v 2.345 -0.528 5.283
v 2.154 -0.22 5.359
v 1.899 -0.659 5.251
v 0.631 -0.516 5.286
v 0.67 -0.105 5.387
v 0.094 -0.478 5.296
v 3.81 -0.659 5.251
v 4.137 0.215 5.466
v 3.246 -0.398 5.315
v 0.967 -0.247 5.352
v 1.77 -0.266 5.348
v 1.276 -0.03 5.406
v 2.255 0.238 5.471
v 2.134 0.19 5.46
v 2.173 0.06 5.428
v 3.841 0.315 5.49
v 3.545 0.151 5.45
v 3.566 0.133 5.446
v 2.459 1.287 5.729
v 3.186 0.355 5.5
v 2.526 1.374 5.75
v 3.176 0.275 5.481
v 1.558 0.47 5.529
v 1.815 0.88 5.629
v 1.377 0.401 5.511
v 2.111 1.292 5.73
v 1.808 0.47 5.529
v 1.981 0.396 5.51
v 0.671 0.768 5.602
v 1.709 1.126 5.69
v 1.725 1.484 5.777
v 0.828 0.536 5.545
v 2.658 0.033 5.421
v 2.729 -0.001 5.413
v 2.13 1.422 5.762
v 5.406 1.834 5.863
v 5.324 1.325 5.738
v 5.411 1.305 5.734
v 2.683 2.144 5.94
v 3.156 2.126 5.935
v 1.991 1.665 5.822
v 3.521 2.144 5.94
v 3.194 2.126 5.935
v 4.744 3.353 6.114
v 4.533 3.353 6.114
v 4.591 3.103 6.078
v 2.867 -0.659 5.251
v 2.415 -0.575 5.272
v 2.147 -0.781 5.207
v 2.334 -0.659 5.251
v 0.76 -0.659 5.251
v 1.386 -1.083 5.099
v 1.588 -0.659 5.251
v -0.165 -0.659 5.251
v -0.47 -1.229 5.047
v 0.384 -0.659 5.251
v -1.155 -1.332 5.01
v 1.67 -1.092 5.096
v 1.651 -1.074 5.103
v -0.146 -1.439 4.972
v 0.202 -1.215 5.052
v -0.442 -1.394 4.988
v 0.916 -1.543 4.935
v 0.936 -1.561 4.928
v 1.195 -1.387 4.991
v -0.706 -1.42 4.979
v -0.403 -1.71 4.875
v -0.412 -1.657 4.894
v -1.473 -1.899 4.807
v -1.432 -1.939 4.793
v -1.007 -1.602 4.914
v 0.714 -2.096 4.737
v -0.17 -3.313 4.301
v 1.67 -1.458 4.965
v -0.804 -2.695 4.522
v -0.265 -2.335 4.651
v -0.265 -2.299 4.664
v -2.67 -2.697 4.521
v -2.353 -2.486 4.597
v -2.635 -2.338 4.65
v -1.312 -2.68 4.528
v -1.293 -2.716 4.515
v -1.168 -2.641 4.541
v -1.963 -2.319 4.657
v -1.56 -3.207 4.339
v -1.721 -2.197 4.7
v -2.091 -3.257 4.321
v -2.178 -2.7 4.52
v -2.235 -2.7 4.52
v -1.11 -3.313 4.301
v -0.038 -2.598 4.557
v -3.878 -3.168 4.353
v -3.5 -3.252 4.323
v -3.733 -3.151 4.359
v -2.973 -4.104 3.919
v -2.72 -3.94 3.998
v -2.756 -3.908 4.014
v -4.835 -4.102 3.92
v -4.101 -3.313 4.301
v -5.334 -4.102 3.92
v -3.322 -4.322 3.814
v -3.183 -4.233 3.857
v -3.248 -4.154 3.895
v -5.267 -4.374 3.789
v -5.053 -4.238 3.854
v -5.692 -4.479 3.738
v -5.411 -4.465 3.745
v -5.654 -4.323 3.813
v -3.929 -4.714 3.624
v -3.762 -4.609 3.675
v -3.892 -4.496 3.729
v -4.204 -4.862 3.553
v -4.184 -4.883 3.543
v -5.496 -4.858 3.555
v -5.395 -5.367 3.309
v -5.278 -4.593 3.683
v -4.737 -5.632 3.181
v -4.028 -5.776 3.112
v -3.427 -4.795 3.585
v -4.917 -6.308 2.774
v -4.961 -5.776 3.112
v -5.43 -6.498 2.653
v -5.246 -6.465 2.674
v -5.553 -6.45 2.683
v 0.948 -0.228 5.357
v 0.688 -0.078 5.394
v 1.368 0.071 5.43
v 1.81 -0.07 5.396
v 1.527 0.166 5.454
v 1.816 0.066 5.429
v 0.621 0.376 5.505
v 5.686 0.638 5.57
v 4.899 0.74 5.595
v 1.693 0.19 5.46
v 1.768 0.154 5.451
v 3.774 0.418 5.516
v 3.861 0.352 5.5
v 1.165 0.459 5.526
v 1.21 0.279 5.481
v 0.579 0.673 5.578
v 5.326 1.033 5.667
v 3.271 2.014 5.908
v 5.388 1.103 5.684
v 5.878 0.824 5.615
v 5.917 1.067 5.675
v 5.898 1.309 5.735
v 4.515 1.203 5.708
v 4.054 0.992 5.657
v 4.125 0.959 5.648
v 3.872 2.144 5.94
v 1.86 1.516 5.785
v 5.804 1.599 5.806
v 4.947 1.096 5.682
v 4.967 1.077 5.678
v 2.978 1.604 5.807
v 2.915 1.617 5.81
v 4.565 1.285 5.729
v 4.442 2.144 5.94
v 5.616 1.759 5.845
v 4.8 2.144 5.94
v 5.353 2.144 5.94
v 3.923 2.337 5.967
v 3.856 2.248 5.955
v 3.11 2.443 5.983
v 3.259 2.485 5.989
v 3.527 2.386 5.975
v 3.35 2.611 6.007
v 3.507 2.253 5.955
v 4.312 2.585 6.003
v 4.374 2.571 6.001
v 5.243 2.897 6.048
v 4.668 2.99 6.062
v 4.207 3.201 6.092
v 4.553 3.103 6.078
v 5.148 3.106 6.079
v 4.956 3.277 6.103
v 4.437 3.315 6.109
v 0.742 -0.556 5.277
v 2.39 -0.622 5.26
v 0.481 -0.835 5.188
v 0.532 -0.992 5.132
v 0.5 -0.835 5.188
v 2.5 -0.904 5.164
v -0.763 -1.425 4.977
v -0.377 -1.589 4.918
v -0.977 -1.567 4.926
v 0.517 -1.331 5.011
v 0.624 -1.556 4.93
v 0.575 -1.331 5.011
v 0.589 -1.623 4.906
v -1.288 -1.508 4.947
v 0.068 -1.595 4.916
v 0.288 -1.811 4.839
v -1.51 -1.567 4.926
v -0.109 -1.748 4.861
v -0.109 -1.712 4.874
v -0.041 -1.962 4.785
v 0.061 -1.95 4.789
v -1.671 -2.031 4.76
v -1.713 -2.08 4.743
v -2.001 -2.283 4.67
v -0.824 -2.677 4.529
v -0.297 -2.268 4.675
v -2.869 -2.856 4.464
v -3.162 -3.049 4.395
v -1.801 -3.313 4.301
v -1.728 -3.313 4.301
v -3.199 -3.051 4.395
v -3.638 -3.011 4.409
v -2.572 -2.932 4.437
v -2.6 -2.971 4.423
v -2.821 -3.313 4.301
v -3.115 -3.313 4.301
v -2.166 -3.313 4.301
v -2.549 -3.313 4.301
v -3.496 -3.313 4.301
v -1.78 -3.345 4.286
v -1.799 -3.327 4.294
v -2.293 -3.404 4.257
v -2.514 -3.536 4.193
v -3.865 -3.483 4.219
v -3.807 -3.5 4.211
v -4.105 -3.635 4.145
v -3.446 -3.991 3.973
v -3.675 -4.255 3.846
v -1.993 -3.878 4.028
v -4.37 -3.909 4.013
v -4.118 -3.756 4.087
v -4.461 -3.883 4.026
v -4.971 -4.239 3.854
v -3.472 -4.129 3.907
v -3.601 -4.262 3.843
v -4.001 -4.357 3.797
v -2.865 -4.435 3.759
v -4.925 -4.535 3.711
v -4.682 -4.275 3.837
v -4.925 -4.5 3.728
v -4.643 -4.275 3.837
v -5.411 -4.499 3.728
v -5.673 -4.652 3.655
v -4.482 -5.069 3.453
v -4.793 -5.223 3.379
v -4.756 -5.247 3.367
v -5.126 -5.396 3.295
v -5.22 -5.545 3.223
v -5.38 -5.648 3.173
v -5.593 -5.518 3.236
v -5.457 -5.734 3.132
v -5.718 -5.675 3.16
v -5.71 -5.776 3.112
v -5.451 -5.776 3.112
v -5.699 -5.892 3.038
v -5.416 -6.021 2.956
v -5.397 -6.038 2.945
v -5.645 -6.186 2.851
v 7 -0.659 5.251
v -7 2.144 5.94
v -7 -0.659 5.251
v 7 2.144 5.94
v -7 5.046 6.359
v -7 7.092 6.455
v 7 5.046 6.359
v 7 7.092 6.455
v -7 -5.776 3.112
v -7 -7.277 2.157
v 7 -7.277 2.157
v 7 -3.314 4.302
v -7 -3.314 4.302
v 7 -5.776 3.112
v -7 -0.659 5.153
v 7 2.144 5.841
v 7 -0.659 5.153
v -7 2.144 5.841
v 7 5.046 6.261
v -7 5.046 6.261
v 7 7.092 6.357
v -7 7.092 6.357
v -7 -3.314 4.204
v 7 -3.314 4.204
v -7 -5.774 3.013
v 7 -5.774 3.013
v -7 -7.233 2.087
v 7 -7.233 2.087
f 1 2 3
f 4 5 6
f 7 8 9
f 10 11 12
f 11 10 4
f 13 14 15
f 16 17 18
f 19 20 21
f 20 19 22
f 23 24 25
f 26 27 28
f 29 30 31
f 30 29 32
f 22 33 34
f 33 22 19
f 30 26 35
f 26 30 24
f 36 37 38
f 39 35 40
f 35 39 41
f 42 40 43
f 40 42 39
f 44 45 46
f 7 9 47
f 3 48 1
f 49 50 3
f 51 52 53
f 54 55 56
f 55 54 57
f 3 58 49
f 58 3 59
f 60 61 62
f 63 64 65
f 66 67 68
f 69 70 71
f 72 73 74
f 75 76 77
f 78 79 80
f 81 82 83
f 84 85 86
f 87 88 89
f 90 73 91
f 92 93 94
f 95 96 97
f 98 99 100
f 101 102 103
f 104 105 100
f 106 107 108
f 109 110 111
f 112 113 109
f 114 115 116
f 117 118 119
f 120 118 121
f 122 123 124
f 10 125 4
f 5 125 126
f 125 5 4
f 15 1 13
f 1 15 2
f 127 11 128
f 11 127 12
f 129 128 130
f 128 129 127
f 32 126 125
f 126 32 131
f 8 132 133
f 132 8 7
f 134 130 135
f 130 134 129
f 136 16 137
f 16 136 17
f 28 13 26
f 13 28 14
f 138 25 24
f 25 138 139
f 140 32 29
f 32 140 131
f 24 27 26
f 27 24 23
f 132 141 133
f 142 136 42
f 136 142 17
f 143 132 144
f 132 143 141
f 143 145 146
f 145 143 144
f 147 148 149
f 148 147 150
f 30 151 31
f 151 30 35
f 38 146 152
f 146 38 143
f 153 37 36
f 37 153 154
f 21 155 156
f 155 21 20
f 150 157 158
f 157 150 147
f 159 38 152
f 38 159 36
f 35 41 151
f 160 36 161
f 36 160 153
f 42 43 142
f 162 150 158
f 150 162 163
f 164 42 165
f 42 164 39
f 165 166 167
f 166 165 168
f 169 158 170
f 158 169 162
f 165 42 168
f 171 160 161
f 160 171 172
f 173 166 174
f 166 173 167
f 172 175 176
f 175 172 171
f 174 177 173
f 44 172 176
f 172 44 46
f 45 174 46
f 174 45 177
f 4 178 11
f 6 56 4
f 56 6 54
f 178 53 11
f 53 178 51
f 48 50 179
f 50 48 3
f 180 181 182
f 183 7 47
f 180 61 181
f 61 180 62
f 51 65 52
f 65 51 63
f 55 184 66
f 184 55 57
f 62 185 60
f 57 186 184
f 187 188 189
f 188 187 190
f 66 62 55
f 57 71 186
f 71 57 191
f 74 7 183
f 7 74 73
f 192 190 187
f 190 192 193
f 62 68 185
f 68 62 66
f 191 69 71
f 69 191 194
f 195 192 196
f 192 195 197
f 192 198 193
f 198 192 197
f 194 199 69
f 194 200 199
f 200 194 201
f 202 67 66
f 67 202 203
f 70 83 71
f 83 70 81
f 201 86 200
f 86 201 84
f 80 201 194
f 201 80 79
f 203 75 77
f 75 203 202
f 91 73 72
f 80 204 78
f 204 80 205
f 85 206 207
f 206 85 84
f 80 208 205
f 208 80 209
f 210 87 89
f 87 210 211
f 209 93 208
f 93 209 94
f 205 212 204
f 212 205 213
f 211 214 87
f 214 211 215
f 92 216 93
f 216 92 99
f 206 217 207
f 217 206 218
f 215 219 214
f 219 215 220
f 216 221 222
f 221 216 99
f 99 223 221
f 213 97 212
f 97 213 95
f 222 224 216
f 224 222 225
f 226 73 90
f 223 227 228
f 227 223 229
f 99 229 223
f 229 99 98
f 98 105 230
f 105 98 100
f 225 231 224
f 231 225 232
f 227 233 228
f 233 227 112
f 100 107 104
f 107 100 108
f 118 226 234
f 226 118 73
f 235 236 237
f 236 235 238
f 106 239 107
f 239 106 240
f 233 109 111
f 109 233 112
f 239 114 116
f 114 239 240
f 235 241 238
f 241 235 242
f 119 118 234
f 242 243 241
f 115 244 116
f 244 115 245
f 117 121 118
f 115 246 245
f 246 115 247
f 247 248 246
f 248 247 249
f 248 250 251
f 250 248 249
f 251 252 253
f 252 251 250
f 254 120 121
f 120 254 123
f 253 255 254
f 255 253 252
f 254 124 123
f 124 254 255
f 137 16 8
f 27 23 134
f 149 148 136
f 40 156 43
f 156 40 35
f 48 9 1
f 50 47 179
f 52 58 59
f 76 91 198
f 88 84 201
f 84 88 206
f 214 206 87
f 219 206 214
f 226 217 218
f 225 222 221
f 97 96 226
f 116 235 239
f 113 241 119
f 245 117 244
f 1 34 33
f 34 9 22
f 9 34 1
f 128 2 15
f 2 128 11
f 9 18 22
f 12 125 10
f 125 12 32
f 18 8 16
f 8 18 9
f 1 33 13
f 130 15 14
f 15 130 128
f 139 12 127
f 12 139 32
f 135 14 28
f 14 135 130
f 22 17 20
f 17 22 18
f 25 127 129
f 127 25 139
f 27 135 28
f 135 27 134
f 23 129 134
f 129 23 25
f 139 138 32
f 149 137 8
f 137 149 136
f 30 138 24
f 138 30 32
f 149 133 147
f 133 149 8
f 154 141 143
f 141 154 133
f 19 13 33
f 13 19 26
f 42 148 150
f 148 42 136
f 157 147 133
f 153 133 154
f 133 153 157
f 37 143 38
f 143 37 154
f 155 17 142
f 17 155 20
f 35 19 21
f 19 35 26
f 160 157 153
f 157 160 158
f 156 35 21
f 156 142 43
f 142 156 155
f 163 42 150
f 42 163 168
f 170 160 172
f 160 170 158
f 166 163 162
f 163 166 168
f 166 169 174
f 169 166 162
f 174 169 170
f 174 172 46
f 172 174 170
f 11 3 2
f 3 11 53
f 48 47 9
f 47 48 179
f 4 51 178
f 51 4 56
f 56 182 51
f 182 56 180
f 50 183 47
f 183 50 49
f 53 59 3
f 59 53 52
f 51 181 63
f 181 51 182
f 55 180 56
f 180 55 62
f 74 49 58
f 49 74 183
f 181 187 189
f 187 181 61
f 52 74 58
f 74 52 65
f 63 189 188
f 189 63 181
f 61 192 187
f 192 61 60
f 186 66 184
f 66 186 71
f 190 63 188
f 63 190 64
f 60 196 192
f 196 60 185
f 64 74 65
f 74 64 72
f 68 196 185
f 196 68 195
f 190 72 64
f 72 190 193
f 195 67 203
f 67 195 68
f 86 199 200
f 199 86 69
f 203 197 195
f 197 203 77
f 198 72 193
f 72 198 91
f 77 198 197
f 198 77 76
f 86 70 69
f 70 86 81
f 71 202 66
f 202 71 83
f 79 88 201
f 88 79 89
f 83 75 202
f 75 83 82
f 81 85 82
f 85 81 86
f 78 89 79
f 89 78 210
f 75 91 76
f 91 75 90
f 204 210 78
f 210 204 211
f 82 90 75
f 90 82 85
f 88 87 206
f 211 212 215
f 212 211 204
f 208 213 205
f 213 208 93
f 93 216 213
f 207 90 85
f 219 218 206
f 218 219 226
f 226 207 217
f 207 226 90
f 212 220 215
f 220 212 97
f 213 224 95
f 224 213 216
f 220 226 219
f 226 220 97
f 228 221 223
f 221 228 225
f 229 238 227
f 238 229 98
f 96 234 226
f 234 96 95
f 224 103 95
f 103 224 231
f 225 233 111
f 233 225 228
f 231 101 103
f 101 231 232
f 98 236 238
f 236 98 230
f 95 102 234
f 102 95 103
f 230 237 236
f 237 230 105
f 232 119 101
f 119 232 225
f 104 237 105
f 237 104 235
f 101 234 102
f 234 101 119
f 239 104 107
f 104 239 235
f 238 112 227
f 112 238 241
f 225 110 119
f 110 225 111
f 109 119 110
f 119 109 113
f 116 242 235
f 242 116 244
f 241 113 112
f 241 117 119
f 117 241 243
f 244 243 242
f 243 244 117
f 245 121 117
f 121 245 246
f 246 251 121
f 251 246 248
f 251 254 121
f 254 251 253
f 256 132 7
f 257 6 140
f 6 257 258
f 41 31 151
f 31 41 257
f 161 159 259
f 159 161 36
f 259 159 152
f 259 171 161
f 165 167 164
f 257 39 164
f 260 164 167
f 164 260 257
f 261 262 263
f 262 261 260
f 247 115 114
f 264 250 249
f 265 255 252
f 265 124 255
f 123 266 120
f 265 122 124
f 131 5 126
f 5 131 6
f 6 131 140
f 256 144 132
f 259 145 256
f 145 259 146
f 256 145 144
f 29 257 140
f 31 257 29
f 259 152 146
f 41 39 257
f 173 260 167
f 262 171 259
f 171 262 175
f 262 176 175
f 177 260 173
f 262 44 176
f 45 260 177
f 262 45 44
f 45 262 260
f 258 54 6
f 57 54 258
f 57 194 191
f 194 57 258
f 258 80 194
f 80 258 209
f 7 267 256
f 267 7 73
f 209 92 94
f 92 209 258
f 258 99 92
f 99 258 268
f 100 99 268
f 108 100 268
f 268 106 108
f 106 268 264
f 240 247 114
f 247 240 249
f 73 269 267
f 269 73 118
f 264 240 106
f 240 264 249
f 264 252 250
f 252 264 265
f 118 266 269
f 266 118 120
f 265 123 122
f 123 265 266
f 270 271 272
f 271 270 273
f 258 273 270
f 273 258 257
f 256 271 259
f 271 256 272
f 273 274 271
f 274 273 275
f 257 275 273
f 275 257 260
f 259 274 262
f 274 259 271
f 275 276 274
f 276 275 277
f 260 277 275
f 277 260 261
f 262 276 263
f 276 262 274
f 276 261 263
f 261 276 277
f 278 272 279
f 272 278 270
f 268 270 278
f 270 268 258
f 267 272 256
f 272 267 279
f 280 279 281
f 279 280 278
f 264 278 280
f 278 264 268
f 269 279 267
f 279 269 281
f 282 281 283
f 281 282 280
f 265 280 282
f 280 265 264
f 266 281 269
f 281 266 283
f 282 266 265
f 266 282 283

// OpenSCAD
use <../lib.scad>
use <s/6296256ec01s01.scad>
function ldraw_lib__6296256ec01() = [
// 0 Sticker  1.9 x  1.8 with "nuova 500" Emblem on Bright Light Yellow (Formed)
// 0 Name: 6296256ec01.dat
// 0 Author: Magnus Forsberg [MagFors]
// 0 !LDRAW_ORG Part UPDATE 2024-05
// 0 !LICENSE Licensed under CC BY 4.0 : see CAreadme.txt
// 
// 0 BFC CERTIFY CCW
  [0,"BFC","CERTIFY"],
  [0,"BFC","CCW"],
// 
// 0 !KEYWORDS 500, Bricklink 10271stk01, Brickowl 815806, Cinquecento, FIAT, Nuova
// 0 !KEYWORDS Rebrickable 67343, set 10271
// 
// 0 !HISTORY 2020-12-29 [PTadmin] Official Update 2020-03
// 0 !HISTORY 2021-09-11 [MagFors] Subfiled for blue version
// 0 !HISTORY 2024-06-30 [OrionP] Official Update 2024-05
// 
// 
// 1 226 0 0 0 1 0 0 0 1 0 0 0 1 s\6296256ec01s01.dat
  [1,226,0,0,0,1,0,0,0,1,0,0,0,1, ldraw_lib__s__6296256ec01s01()],
// 0 // backside
// 4 16 -17.5 -12.8827 -1.648 -17.5 -14.6036 5.36 17.5 -14.6036 5.36 17.5 -12.8827 -1.648
  [4,16,-17.5,-12.8827,-1.648,-17.5,-14.6036,5.36,17.5,-14.6036,5.36,17.5,-12.8827,-1.648],
// 4 16 -17.5 -12.8827 -1.648 -17.5 -13.1279 -1.648 -17.5 -14.8489 5.36 -17.5 -14.6036 5.36
  [4,16,-17.5,-12.8827,-1.648,-17.5,-13.1279,-1.648,-17.5,-14.8489,5.36,-17.5,-14.6036,5.36],
// 4 16 17.5 -13.1279 -1.648 17.5 -12.8827 -1.648 17.5 -14.6036 5.36 17.5 -14.8489 5.36
  [4,16,17.5,-13.1279,-1.648,17.5,-12.8827,-1.648,17.5,-14.6036,5.36,17.5,-14.8489,5.36],
// 4 16 17.5 -14.6036 5.36 -17.5 -14.6036 5.36 -17.5 -15.6524 12.616 17.5 -15.6524 12.616
  [4,16,17.5,-14.6036,5.36,-17.5,-14.6036,5.36,-17.5,-15.6524,12.616,17.5,-15.6524,12.616],
// 4 16 -17.5 -14.6036 5.36 -17.5 -14.8489 5.36 -17.5 -15.8969 12.616 -17.5 -15.6524 12.616
  [4,16,-17.5,-14.6036,5.36,-17.5,-14.8489,5.36,-17.5,-15.8969,12.616,-17.5,-15.6524,12.616],
// 4 16 17.5 -14.8489 5.36 17.5 -14.6036 5.36 17.5 -15.6524 12.616 17.5 -15.8969 12.616
  [4,16,17.5,-14.8489,5.36,17.5,-14.6036,5.36,17.5,-15.6524,12.616,17.5,-15.8969,12.616],
// 4 16 -17.5 -15.6524 12.616 -17.5 -15.8932 17.7298 17.5 -15.8932 17.7298 17.5 -15.6524 12.616
  [4,16,-17.5,-15.6524,12.616,-17.5,-15.8932,17.7298,17.5,-15.8932,17.7298,17.5,-15.6524,12.616],
// 4 16 -17.5 -15.6524 12.616 -17.5 -15.8969 12.616 -17.5 -16.1379 17.7301 -17.5 -15.8932 17.7298
  [4,16,-17.5,-15.6524,12.616,-17.5,-15.8969,12.616,-17.5,-16.1379,17.7301,-17.5,-15.8932,17.7298],
// 4 16 17.5 -15.8969 12.616 17.5 -15.6524 12.616 17.5 -15.8932 17.7298 17.5 -16.1379 17.7301
  [4,16,17.5,-15.8969,12.616,17.5,-15.6524,12.616,17.5,-15.8932,17.7298,17.5,-16.1379,17.7301],
// 4 16 -17.5 -16.1379 17.7301 17.5 -16.1379 17.7301 17.5 -15.8932 17.7298 -17.5 -15.8932 17.7298
  [4,16,-17.5,-16.1379,17.7301,17.5,-16.1379,17.7301,17.5,-15.8932,17.7298,-17.5,-15.8932,17.7298],
// 4 16 17.5 -12.8827 -1.648 17.5 -10.5099 -8.284 -17.5 -10.5099 -8.284 -17.5 -12.8827 -1.648
  [4,16,17.5,-12.8827,-1.648,17.5,-10.5099,-8.284,-17.5,-10.5099,-8.284,-17.5,-12.8827,-1.648],
// 4 16 -17.5 -12.8827 -1.648 -17.5 -10.5099 -8.284 -17.5 -10.7549 -8.284 -17.5 -13.1279 -1.648
  [4,16,-17.5,-12.8827,-1.648,-17.5,-10.5099,-8.284,-17.5,-10.7549,-8.284,-17.5,-13.1279,-1.648],
// 4 16 17.5 -13.1279 -1.648 17.5 -10.7549 -8.284 17.5 -10.5099 -8.284 17.5 -12.8827 -1.648
  [4,16,17.5,-13.1279,-1.648,17.5,-10.7549,-8.284,17.5,-10.5099,-8.284,17.5,-12.8827,-1.648],
// 4 16 -17.5 -10.5099 -8.284 17.5 -10.5099 -8.284 17.5 -7.5316 -14.436 -17.5 -7.5316 -14.436
  [4,16,-17.5,-10.5099,-8.284,17.5,-10.5099,-8.284,17.5,-7.5316,-14.436,-17.5,-7.5316,-14.436],
// 4 16 -17.5 -10.7549 -8.284 -17.5 -10.5099 -8.284 -17.5 -7.5316 -14.436 -17.5 -7.7789 -14.44
  [4,16,-17.5,-10.7549,-8.284,-17.5,-10.5099,-8.284,-17.5,-7.5316,-14.436,-17.5,-7.7789,-14.44],
// 4 16 17.5 -10.5099 -8.284 17.5 -10.7549 -8.284 17.5 -7.7789 -14.44 17.5 -7.5316 -14.436
  [4,16,17.5,-10.5099,-8.284,17.5,-10.7549,-8.284,17.5,-7.7789,-14.44,17.5,-7.5316,-14.436],
// 4 16 -17.5 -7.5316 -14.436 17.5 -7.5316 -14.436 17.5 -5.2174 -18.0819 -17.5 -5.2174 -18.0819
  [4,16,-17.5,-7.5316,-14.436,17.5,-7.5316,-14.436,17.5,-5.2174,-18.0819,-17.5,-5.2174,-18.0819],
// 4 16 -17.5 -7.7789 -14.44 -17.5 -7.5316 -14.436 -17.5 -5.2174 -18.0819 -17.5 -5.3931 -18.1936
  [4,16,-17.5,-7.7789,-14.44,-17.5,-7.5316,-14.436,-17.5,-5.2174,-18.0819,-17.5,-5.3931,-18.1936],
// 4 16 17.5 -7.5316 -14.436 17.5 -7.7789 -14.44 17.5 -5.3931 -18.1936 17.5 -5.2174 -18.0819
  [4,16,17.5,-7.5316,-14.436,17.5,-7.7789,-14.44,17.5,-5.3931,-18.1936,17.5,-5.2174,-18.0819],
// 4 16 -17.5 -5.3931 -18.1936 -17.5 -5.2174 -18.0819 17.5 -5.2174 -18.0819 17.5 -5.3931 -18.1936
  [4,16,-17.5,-5.3931,-18.1936,-17.5,-5.2174,-18.0819,17.5,-5.2174,-18.0819,17.5,-5.3931,-18.1936],
// 5 24 17.5 -15.8969 12.616 -17.5 -15.8969 12.616 17.5 -16.1379 17.7301 17.5 -14.8489 5.36
  [5,24,17.5,-15.8969,12.616,-17.5,-15.8969,12.616,17.5,-16.1379,17.7301,17.5,-14.8489,5.36],
// 5 24 17.5 -14.8489 5.36 -17.5 -14.8489 5.36 17.5 -15.8969 12.616 17.5 -13.1279 -1.648
  [5,24,17.5,-14.8489,5.36,-17.5,-14.8489,5.36,17.5,-15.8969,12.616,17.5,-13.1279,-1.648],
// 5 24 17.5 -13.1279 -1.648 -17.5 -13.1279 -1.648 17.5 -14.8489 5.36 17.5 -10.7549 -8.284
  [5,24,17.5,-13.1279,-1.648,-17.5,-13.1279,-1.648,17.5,-14.8489,5.36,17.5,-10.7549,-8.284],
// 5 24 17.5 -10.7549 -8.284 -17.5 -10.7549 -8.284 17.5 -13.1279 -1.648 17.5 -7.7789 -14.44
  [5,24,17.5,-10.7549,-8.284,-17.5,-10.7549,-8.284,17.5,-13.1279,-1.648,17.5,-7.7789,-14.44],
// 5 24 17.5 -7.7789 -14.44 -17.5 -7.7789 -14.44 17.5 -10.7549 -8.284 17.5 -5.3931 -18.1936
  [5,24,17.5,-7.7789,-14.44,-17.5,-7.7789,-14.44,17.5,-10.7549,-8.284,17.5,-5.3931,-18.1936],
// 5 24 17.5 -15.6524 12.616 -17.5 -15.6524 12.616 17.5 -15.8932 17.7298 17.5 -14.6036 5.36
  [5,24,17.5,-15.6524,12.616,-17.5,-15.6524,12.616,17.5,-15.8932,17.7298,17.5,-14.6036,5.36],
// 5 24 17.5 -14.6036 5.36 -17.5 -14.6036 5.36 17.5 -15.6524 12.616 17.5 -12.8827 -1.648
  [5,24,17.5,-14.6036,5.36,-17.5,-14.6036,5.36,17.5,-15.6524,12.616,17.5,-12.8827,-1.648],
// 5 24 17.5 -12.8827 -1.648 -17.5 -12.8827 -1.648 17.5 -14.6036 5.36 17.5 -10.5099 -8.284
  [5,24,17.5,-12.8827,-1.648,-17.5,-12.8827,-1.648,17.5,-14.6036,5.36,17.5,-10.5099,-8.284],
// 5 24 17.5 -10.5099 -8.284 -17.5 -10.5099 -8.284 17.5 -12.8827 -1.648 17.5 -7.5316 -14.436
  [5,24,17.5,-10.5099,-8.284,-17.5,-10.5099,-8.284,17.5,-12.8827,-1.648,17.5,-7.5316,-14.436],
// 5 24 17.5 -7.5316 -14.436 -17.5 -7.5316 -14.436 17.5 -10.5099 -8.284 17.5 -5.2174 -18.0819
  [5,24,17.5,-7.5316,-14.436,-17.5,-7.5316,-14.436,17.5,-10.5099,-8.284,17.5,-5.2174,-18.0819],
];
module ldraw_lib__6296256ec01(step=0, col=false, unit=2/5, alt=false, line=0.2, solid=!$preview)
    makepoly(ldraw_lib__6296256ec01(), step=step, col=col, unit=unit, alt=alt, line=line, solid=solid);
ldraw_lib__6296256ec01(line=0.2);
